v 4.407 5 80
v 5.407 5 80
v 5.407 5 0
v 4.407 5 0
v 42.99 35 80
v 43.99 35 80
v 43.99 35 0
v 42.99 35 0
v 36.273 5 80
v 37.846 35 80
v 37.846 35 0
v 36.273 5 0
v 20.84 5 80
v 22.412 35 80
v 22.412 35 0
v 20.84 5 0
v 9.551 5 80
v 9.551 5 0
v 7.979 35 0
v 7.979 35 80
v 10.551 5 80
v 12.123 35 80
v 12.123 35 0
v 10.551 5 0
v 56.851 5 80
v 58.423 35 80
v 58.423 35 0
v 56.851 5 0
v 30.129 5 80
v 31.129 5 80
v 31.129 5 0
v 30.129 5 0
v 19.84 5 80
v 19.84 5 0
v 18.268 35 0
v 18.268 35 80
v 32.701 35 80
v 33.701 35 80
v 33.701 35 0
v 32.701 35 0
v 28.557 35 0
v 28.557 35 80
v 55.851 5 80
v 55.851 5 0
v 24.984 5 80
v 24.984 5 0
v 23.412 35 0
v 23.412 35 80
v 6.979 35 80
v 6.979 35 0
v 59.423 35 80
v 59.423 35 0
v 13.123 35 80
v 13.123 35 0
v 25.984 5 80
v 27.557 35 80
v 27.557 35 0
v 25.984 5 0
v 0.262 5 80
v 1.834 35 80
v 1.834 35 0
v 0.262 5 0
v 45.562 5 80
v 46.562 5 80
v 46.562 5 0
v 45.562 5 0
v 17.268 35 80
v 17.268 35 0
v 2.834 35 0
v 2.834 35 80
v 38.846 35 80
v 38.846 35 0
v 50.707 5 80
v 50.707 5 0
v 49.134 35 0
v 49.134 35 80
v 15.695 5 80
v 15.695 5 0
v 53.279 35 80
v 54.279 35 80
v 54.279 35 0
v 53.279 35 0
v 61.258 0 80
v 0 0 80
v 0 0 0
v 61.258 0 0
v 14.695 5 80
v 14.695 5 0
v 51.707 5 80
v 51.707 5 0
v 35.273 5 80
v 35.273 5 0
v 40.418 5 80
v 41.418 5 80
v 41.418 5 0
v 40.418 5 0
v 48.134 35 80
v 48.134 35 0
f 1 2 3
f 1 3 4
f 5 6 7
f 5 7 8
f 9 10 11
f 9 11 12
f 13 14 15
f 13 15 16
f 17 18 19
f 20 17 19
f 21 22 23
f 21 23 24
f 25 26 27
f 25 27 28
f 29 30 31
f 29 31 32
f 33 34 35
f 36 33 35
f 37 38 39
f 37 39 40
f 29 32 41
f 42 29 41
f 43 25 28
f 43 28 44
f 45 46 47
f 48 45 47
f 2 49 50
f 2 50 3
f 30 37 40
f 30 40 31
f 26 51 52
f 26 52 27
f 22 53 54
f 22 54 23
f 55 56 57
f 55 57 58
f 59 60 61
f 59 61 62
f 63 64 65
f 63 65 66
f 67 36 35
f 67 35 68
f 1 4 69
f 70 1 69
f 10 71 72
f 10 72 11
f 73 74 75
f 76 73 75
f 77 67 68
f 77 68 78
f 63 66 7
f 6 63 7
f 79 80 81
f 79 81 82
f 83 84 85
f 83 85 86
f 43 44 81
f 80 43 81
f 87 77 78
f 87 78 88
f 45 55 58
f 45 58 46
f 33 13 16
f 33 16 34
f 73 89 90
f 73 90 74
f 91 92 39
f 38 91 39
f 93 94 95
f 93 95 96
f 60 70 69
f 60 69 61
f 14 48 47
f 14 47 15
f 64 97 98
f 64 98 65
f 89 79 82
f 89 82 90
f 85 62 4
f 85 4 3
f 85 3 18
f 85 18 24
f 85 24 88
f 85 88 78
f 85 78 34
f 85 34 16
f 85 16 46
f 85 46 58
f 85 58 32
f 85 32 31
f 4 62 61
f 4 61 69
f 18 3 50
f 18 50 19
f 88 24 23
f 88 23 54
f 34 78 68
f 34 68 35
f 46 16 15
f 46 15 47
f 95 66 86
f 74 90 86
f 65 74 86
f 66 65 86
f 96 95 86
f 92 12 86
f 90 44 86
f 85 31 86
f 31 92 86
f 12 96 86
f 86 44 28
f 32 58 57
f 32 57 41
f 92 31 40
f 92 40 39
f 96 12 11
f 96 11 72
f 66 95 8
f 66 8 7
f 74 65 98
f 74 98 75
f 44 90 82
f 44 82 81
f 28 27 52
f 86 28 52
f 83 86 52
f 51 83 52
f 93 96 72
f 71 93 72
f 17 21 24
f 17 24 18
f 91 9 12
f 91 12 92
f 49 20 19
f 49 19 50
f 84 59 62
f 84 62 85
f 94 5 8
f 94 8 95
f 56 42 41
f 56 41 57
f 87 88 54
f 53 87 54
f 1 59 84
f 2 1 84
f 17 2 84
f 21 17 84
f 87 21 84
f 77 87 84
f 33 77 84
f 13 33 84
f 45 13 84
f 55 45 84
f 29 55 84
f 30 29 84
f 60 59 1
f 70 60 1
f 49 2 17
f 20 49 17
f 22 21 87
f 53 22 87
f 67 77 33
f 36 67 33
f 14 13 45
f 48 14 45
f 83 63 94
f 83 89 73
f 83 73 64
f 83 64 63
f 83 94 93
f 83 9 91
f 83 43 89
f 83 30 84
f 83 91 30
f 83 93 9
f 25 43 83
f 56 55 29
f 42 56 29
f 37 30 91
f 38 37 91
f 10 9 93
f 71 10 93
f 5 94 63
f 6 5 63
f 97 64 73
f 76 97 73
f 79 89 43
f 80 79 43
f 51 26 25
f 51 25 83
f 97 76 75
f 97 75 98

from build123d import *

# Parameters (mm, degrees)
BOSS_EXTRUDE1_DEPTH = 80


with BuildPart() as part:
    # Sketch1 → Boss-Extrude1 (new body)
    with BuildSketch(Plane.XY):
        Polygon((0, 0), (61.257678877, 0), (59.423406602, 35), (58.423406602, 35), (56.851173223, 5), (55.851173223, 5), (54.278939845, 35), (53.278939845, 35), (51.706706466, 5), (50.706706466, 5), (49.134473088, 35), (48.134473088, 35), (46.562239709, 5), (45.562239709, 5), (43.990006331, 35), (42.990006331, 35), (41.417772952, 5), (40.417772952, 5), (38.845539574, 35), (37.845539574, 35), (36.273306195, 5), (35.273306195, 5), (33.701072817, 35), (32.701072817, 35), (31.128839438, 5), (30.128839438, 5), (28.55660606, 35), (27.55660606, 35), (25.984372681, 5), (24.984372681, 5), (23.412139303, 35), (22.412139303, 35), (20.839905924, 5), (19.839905924, 5), (18.267672546, 35), (17.267672546, 35), (15.695439167, 5), (14.695439167, 5), (13.123205789, 35), (12.123205789, 35), (10.55097241, 5), (9.55097241, 5), (7.978739032, 35), (6.978739032, 35), (5.406505653, 5), (4.406505653, 5), (2.834272275, 35), (1.834272275, 35), (0.262038896, 5), align=None)
    extrude(amount=BOSS_EXTRUDE1_DEPTH)


solid = part.part
